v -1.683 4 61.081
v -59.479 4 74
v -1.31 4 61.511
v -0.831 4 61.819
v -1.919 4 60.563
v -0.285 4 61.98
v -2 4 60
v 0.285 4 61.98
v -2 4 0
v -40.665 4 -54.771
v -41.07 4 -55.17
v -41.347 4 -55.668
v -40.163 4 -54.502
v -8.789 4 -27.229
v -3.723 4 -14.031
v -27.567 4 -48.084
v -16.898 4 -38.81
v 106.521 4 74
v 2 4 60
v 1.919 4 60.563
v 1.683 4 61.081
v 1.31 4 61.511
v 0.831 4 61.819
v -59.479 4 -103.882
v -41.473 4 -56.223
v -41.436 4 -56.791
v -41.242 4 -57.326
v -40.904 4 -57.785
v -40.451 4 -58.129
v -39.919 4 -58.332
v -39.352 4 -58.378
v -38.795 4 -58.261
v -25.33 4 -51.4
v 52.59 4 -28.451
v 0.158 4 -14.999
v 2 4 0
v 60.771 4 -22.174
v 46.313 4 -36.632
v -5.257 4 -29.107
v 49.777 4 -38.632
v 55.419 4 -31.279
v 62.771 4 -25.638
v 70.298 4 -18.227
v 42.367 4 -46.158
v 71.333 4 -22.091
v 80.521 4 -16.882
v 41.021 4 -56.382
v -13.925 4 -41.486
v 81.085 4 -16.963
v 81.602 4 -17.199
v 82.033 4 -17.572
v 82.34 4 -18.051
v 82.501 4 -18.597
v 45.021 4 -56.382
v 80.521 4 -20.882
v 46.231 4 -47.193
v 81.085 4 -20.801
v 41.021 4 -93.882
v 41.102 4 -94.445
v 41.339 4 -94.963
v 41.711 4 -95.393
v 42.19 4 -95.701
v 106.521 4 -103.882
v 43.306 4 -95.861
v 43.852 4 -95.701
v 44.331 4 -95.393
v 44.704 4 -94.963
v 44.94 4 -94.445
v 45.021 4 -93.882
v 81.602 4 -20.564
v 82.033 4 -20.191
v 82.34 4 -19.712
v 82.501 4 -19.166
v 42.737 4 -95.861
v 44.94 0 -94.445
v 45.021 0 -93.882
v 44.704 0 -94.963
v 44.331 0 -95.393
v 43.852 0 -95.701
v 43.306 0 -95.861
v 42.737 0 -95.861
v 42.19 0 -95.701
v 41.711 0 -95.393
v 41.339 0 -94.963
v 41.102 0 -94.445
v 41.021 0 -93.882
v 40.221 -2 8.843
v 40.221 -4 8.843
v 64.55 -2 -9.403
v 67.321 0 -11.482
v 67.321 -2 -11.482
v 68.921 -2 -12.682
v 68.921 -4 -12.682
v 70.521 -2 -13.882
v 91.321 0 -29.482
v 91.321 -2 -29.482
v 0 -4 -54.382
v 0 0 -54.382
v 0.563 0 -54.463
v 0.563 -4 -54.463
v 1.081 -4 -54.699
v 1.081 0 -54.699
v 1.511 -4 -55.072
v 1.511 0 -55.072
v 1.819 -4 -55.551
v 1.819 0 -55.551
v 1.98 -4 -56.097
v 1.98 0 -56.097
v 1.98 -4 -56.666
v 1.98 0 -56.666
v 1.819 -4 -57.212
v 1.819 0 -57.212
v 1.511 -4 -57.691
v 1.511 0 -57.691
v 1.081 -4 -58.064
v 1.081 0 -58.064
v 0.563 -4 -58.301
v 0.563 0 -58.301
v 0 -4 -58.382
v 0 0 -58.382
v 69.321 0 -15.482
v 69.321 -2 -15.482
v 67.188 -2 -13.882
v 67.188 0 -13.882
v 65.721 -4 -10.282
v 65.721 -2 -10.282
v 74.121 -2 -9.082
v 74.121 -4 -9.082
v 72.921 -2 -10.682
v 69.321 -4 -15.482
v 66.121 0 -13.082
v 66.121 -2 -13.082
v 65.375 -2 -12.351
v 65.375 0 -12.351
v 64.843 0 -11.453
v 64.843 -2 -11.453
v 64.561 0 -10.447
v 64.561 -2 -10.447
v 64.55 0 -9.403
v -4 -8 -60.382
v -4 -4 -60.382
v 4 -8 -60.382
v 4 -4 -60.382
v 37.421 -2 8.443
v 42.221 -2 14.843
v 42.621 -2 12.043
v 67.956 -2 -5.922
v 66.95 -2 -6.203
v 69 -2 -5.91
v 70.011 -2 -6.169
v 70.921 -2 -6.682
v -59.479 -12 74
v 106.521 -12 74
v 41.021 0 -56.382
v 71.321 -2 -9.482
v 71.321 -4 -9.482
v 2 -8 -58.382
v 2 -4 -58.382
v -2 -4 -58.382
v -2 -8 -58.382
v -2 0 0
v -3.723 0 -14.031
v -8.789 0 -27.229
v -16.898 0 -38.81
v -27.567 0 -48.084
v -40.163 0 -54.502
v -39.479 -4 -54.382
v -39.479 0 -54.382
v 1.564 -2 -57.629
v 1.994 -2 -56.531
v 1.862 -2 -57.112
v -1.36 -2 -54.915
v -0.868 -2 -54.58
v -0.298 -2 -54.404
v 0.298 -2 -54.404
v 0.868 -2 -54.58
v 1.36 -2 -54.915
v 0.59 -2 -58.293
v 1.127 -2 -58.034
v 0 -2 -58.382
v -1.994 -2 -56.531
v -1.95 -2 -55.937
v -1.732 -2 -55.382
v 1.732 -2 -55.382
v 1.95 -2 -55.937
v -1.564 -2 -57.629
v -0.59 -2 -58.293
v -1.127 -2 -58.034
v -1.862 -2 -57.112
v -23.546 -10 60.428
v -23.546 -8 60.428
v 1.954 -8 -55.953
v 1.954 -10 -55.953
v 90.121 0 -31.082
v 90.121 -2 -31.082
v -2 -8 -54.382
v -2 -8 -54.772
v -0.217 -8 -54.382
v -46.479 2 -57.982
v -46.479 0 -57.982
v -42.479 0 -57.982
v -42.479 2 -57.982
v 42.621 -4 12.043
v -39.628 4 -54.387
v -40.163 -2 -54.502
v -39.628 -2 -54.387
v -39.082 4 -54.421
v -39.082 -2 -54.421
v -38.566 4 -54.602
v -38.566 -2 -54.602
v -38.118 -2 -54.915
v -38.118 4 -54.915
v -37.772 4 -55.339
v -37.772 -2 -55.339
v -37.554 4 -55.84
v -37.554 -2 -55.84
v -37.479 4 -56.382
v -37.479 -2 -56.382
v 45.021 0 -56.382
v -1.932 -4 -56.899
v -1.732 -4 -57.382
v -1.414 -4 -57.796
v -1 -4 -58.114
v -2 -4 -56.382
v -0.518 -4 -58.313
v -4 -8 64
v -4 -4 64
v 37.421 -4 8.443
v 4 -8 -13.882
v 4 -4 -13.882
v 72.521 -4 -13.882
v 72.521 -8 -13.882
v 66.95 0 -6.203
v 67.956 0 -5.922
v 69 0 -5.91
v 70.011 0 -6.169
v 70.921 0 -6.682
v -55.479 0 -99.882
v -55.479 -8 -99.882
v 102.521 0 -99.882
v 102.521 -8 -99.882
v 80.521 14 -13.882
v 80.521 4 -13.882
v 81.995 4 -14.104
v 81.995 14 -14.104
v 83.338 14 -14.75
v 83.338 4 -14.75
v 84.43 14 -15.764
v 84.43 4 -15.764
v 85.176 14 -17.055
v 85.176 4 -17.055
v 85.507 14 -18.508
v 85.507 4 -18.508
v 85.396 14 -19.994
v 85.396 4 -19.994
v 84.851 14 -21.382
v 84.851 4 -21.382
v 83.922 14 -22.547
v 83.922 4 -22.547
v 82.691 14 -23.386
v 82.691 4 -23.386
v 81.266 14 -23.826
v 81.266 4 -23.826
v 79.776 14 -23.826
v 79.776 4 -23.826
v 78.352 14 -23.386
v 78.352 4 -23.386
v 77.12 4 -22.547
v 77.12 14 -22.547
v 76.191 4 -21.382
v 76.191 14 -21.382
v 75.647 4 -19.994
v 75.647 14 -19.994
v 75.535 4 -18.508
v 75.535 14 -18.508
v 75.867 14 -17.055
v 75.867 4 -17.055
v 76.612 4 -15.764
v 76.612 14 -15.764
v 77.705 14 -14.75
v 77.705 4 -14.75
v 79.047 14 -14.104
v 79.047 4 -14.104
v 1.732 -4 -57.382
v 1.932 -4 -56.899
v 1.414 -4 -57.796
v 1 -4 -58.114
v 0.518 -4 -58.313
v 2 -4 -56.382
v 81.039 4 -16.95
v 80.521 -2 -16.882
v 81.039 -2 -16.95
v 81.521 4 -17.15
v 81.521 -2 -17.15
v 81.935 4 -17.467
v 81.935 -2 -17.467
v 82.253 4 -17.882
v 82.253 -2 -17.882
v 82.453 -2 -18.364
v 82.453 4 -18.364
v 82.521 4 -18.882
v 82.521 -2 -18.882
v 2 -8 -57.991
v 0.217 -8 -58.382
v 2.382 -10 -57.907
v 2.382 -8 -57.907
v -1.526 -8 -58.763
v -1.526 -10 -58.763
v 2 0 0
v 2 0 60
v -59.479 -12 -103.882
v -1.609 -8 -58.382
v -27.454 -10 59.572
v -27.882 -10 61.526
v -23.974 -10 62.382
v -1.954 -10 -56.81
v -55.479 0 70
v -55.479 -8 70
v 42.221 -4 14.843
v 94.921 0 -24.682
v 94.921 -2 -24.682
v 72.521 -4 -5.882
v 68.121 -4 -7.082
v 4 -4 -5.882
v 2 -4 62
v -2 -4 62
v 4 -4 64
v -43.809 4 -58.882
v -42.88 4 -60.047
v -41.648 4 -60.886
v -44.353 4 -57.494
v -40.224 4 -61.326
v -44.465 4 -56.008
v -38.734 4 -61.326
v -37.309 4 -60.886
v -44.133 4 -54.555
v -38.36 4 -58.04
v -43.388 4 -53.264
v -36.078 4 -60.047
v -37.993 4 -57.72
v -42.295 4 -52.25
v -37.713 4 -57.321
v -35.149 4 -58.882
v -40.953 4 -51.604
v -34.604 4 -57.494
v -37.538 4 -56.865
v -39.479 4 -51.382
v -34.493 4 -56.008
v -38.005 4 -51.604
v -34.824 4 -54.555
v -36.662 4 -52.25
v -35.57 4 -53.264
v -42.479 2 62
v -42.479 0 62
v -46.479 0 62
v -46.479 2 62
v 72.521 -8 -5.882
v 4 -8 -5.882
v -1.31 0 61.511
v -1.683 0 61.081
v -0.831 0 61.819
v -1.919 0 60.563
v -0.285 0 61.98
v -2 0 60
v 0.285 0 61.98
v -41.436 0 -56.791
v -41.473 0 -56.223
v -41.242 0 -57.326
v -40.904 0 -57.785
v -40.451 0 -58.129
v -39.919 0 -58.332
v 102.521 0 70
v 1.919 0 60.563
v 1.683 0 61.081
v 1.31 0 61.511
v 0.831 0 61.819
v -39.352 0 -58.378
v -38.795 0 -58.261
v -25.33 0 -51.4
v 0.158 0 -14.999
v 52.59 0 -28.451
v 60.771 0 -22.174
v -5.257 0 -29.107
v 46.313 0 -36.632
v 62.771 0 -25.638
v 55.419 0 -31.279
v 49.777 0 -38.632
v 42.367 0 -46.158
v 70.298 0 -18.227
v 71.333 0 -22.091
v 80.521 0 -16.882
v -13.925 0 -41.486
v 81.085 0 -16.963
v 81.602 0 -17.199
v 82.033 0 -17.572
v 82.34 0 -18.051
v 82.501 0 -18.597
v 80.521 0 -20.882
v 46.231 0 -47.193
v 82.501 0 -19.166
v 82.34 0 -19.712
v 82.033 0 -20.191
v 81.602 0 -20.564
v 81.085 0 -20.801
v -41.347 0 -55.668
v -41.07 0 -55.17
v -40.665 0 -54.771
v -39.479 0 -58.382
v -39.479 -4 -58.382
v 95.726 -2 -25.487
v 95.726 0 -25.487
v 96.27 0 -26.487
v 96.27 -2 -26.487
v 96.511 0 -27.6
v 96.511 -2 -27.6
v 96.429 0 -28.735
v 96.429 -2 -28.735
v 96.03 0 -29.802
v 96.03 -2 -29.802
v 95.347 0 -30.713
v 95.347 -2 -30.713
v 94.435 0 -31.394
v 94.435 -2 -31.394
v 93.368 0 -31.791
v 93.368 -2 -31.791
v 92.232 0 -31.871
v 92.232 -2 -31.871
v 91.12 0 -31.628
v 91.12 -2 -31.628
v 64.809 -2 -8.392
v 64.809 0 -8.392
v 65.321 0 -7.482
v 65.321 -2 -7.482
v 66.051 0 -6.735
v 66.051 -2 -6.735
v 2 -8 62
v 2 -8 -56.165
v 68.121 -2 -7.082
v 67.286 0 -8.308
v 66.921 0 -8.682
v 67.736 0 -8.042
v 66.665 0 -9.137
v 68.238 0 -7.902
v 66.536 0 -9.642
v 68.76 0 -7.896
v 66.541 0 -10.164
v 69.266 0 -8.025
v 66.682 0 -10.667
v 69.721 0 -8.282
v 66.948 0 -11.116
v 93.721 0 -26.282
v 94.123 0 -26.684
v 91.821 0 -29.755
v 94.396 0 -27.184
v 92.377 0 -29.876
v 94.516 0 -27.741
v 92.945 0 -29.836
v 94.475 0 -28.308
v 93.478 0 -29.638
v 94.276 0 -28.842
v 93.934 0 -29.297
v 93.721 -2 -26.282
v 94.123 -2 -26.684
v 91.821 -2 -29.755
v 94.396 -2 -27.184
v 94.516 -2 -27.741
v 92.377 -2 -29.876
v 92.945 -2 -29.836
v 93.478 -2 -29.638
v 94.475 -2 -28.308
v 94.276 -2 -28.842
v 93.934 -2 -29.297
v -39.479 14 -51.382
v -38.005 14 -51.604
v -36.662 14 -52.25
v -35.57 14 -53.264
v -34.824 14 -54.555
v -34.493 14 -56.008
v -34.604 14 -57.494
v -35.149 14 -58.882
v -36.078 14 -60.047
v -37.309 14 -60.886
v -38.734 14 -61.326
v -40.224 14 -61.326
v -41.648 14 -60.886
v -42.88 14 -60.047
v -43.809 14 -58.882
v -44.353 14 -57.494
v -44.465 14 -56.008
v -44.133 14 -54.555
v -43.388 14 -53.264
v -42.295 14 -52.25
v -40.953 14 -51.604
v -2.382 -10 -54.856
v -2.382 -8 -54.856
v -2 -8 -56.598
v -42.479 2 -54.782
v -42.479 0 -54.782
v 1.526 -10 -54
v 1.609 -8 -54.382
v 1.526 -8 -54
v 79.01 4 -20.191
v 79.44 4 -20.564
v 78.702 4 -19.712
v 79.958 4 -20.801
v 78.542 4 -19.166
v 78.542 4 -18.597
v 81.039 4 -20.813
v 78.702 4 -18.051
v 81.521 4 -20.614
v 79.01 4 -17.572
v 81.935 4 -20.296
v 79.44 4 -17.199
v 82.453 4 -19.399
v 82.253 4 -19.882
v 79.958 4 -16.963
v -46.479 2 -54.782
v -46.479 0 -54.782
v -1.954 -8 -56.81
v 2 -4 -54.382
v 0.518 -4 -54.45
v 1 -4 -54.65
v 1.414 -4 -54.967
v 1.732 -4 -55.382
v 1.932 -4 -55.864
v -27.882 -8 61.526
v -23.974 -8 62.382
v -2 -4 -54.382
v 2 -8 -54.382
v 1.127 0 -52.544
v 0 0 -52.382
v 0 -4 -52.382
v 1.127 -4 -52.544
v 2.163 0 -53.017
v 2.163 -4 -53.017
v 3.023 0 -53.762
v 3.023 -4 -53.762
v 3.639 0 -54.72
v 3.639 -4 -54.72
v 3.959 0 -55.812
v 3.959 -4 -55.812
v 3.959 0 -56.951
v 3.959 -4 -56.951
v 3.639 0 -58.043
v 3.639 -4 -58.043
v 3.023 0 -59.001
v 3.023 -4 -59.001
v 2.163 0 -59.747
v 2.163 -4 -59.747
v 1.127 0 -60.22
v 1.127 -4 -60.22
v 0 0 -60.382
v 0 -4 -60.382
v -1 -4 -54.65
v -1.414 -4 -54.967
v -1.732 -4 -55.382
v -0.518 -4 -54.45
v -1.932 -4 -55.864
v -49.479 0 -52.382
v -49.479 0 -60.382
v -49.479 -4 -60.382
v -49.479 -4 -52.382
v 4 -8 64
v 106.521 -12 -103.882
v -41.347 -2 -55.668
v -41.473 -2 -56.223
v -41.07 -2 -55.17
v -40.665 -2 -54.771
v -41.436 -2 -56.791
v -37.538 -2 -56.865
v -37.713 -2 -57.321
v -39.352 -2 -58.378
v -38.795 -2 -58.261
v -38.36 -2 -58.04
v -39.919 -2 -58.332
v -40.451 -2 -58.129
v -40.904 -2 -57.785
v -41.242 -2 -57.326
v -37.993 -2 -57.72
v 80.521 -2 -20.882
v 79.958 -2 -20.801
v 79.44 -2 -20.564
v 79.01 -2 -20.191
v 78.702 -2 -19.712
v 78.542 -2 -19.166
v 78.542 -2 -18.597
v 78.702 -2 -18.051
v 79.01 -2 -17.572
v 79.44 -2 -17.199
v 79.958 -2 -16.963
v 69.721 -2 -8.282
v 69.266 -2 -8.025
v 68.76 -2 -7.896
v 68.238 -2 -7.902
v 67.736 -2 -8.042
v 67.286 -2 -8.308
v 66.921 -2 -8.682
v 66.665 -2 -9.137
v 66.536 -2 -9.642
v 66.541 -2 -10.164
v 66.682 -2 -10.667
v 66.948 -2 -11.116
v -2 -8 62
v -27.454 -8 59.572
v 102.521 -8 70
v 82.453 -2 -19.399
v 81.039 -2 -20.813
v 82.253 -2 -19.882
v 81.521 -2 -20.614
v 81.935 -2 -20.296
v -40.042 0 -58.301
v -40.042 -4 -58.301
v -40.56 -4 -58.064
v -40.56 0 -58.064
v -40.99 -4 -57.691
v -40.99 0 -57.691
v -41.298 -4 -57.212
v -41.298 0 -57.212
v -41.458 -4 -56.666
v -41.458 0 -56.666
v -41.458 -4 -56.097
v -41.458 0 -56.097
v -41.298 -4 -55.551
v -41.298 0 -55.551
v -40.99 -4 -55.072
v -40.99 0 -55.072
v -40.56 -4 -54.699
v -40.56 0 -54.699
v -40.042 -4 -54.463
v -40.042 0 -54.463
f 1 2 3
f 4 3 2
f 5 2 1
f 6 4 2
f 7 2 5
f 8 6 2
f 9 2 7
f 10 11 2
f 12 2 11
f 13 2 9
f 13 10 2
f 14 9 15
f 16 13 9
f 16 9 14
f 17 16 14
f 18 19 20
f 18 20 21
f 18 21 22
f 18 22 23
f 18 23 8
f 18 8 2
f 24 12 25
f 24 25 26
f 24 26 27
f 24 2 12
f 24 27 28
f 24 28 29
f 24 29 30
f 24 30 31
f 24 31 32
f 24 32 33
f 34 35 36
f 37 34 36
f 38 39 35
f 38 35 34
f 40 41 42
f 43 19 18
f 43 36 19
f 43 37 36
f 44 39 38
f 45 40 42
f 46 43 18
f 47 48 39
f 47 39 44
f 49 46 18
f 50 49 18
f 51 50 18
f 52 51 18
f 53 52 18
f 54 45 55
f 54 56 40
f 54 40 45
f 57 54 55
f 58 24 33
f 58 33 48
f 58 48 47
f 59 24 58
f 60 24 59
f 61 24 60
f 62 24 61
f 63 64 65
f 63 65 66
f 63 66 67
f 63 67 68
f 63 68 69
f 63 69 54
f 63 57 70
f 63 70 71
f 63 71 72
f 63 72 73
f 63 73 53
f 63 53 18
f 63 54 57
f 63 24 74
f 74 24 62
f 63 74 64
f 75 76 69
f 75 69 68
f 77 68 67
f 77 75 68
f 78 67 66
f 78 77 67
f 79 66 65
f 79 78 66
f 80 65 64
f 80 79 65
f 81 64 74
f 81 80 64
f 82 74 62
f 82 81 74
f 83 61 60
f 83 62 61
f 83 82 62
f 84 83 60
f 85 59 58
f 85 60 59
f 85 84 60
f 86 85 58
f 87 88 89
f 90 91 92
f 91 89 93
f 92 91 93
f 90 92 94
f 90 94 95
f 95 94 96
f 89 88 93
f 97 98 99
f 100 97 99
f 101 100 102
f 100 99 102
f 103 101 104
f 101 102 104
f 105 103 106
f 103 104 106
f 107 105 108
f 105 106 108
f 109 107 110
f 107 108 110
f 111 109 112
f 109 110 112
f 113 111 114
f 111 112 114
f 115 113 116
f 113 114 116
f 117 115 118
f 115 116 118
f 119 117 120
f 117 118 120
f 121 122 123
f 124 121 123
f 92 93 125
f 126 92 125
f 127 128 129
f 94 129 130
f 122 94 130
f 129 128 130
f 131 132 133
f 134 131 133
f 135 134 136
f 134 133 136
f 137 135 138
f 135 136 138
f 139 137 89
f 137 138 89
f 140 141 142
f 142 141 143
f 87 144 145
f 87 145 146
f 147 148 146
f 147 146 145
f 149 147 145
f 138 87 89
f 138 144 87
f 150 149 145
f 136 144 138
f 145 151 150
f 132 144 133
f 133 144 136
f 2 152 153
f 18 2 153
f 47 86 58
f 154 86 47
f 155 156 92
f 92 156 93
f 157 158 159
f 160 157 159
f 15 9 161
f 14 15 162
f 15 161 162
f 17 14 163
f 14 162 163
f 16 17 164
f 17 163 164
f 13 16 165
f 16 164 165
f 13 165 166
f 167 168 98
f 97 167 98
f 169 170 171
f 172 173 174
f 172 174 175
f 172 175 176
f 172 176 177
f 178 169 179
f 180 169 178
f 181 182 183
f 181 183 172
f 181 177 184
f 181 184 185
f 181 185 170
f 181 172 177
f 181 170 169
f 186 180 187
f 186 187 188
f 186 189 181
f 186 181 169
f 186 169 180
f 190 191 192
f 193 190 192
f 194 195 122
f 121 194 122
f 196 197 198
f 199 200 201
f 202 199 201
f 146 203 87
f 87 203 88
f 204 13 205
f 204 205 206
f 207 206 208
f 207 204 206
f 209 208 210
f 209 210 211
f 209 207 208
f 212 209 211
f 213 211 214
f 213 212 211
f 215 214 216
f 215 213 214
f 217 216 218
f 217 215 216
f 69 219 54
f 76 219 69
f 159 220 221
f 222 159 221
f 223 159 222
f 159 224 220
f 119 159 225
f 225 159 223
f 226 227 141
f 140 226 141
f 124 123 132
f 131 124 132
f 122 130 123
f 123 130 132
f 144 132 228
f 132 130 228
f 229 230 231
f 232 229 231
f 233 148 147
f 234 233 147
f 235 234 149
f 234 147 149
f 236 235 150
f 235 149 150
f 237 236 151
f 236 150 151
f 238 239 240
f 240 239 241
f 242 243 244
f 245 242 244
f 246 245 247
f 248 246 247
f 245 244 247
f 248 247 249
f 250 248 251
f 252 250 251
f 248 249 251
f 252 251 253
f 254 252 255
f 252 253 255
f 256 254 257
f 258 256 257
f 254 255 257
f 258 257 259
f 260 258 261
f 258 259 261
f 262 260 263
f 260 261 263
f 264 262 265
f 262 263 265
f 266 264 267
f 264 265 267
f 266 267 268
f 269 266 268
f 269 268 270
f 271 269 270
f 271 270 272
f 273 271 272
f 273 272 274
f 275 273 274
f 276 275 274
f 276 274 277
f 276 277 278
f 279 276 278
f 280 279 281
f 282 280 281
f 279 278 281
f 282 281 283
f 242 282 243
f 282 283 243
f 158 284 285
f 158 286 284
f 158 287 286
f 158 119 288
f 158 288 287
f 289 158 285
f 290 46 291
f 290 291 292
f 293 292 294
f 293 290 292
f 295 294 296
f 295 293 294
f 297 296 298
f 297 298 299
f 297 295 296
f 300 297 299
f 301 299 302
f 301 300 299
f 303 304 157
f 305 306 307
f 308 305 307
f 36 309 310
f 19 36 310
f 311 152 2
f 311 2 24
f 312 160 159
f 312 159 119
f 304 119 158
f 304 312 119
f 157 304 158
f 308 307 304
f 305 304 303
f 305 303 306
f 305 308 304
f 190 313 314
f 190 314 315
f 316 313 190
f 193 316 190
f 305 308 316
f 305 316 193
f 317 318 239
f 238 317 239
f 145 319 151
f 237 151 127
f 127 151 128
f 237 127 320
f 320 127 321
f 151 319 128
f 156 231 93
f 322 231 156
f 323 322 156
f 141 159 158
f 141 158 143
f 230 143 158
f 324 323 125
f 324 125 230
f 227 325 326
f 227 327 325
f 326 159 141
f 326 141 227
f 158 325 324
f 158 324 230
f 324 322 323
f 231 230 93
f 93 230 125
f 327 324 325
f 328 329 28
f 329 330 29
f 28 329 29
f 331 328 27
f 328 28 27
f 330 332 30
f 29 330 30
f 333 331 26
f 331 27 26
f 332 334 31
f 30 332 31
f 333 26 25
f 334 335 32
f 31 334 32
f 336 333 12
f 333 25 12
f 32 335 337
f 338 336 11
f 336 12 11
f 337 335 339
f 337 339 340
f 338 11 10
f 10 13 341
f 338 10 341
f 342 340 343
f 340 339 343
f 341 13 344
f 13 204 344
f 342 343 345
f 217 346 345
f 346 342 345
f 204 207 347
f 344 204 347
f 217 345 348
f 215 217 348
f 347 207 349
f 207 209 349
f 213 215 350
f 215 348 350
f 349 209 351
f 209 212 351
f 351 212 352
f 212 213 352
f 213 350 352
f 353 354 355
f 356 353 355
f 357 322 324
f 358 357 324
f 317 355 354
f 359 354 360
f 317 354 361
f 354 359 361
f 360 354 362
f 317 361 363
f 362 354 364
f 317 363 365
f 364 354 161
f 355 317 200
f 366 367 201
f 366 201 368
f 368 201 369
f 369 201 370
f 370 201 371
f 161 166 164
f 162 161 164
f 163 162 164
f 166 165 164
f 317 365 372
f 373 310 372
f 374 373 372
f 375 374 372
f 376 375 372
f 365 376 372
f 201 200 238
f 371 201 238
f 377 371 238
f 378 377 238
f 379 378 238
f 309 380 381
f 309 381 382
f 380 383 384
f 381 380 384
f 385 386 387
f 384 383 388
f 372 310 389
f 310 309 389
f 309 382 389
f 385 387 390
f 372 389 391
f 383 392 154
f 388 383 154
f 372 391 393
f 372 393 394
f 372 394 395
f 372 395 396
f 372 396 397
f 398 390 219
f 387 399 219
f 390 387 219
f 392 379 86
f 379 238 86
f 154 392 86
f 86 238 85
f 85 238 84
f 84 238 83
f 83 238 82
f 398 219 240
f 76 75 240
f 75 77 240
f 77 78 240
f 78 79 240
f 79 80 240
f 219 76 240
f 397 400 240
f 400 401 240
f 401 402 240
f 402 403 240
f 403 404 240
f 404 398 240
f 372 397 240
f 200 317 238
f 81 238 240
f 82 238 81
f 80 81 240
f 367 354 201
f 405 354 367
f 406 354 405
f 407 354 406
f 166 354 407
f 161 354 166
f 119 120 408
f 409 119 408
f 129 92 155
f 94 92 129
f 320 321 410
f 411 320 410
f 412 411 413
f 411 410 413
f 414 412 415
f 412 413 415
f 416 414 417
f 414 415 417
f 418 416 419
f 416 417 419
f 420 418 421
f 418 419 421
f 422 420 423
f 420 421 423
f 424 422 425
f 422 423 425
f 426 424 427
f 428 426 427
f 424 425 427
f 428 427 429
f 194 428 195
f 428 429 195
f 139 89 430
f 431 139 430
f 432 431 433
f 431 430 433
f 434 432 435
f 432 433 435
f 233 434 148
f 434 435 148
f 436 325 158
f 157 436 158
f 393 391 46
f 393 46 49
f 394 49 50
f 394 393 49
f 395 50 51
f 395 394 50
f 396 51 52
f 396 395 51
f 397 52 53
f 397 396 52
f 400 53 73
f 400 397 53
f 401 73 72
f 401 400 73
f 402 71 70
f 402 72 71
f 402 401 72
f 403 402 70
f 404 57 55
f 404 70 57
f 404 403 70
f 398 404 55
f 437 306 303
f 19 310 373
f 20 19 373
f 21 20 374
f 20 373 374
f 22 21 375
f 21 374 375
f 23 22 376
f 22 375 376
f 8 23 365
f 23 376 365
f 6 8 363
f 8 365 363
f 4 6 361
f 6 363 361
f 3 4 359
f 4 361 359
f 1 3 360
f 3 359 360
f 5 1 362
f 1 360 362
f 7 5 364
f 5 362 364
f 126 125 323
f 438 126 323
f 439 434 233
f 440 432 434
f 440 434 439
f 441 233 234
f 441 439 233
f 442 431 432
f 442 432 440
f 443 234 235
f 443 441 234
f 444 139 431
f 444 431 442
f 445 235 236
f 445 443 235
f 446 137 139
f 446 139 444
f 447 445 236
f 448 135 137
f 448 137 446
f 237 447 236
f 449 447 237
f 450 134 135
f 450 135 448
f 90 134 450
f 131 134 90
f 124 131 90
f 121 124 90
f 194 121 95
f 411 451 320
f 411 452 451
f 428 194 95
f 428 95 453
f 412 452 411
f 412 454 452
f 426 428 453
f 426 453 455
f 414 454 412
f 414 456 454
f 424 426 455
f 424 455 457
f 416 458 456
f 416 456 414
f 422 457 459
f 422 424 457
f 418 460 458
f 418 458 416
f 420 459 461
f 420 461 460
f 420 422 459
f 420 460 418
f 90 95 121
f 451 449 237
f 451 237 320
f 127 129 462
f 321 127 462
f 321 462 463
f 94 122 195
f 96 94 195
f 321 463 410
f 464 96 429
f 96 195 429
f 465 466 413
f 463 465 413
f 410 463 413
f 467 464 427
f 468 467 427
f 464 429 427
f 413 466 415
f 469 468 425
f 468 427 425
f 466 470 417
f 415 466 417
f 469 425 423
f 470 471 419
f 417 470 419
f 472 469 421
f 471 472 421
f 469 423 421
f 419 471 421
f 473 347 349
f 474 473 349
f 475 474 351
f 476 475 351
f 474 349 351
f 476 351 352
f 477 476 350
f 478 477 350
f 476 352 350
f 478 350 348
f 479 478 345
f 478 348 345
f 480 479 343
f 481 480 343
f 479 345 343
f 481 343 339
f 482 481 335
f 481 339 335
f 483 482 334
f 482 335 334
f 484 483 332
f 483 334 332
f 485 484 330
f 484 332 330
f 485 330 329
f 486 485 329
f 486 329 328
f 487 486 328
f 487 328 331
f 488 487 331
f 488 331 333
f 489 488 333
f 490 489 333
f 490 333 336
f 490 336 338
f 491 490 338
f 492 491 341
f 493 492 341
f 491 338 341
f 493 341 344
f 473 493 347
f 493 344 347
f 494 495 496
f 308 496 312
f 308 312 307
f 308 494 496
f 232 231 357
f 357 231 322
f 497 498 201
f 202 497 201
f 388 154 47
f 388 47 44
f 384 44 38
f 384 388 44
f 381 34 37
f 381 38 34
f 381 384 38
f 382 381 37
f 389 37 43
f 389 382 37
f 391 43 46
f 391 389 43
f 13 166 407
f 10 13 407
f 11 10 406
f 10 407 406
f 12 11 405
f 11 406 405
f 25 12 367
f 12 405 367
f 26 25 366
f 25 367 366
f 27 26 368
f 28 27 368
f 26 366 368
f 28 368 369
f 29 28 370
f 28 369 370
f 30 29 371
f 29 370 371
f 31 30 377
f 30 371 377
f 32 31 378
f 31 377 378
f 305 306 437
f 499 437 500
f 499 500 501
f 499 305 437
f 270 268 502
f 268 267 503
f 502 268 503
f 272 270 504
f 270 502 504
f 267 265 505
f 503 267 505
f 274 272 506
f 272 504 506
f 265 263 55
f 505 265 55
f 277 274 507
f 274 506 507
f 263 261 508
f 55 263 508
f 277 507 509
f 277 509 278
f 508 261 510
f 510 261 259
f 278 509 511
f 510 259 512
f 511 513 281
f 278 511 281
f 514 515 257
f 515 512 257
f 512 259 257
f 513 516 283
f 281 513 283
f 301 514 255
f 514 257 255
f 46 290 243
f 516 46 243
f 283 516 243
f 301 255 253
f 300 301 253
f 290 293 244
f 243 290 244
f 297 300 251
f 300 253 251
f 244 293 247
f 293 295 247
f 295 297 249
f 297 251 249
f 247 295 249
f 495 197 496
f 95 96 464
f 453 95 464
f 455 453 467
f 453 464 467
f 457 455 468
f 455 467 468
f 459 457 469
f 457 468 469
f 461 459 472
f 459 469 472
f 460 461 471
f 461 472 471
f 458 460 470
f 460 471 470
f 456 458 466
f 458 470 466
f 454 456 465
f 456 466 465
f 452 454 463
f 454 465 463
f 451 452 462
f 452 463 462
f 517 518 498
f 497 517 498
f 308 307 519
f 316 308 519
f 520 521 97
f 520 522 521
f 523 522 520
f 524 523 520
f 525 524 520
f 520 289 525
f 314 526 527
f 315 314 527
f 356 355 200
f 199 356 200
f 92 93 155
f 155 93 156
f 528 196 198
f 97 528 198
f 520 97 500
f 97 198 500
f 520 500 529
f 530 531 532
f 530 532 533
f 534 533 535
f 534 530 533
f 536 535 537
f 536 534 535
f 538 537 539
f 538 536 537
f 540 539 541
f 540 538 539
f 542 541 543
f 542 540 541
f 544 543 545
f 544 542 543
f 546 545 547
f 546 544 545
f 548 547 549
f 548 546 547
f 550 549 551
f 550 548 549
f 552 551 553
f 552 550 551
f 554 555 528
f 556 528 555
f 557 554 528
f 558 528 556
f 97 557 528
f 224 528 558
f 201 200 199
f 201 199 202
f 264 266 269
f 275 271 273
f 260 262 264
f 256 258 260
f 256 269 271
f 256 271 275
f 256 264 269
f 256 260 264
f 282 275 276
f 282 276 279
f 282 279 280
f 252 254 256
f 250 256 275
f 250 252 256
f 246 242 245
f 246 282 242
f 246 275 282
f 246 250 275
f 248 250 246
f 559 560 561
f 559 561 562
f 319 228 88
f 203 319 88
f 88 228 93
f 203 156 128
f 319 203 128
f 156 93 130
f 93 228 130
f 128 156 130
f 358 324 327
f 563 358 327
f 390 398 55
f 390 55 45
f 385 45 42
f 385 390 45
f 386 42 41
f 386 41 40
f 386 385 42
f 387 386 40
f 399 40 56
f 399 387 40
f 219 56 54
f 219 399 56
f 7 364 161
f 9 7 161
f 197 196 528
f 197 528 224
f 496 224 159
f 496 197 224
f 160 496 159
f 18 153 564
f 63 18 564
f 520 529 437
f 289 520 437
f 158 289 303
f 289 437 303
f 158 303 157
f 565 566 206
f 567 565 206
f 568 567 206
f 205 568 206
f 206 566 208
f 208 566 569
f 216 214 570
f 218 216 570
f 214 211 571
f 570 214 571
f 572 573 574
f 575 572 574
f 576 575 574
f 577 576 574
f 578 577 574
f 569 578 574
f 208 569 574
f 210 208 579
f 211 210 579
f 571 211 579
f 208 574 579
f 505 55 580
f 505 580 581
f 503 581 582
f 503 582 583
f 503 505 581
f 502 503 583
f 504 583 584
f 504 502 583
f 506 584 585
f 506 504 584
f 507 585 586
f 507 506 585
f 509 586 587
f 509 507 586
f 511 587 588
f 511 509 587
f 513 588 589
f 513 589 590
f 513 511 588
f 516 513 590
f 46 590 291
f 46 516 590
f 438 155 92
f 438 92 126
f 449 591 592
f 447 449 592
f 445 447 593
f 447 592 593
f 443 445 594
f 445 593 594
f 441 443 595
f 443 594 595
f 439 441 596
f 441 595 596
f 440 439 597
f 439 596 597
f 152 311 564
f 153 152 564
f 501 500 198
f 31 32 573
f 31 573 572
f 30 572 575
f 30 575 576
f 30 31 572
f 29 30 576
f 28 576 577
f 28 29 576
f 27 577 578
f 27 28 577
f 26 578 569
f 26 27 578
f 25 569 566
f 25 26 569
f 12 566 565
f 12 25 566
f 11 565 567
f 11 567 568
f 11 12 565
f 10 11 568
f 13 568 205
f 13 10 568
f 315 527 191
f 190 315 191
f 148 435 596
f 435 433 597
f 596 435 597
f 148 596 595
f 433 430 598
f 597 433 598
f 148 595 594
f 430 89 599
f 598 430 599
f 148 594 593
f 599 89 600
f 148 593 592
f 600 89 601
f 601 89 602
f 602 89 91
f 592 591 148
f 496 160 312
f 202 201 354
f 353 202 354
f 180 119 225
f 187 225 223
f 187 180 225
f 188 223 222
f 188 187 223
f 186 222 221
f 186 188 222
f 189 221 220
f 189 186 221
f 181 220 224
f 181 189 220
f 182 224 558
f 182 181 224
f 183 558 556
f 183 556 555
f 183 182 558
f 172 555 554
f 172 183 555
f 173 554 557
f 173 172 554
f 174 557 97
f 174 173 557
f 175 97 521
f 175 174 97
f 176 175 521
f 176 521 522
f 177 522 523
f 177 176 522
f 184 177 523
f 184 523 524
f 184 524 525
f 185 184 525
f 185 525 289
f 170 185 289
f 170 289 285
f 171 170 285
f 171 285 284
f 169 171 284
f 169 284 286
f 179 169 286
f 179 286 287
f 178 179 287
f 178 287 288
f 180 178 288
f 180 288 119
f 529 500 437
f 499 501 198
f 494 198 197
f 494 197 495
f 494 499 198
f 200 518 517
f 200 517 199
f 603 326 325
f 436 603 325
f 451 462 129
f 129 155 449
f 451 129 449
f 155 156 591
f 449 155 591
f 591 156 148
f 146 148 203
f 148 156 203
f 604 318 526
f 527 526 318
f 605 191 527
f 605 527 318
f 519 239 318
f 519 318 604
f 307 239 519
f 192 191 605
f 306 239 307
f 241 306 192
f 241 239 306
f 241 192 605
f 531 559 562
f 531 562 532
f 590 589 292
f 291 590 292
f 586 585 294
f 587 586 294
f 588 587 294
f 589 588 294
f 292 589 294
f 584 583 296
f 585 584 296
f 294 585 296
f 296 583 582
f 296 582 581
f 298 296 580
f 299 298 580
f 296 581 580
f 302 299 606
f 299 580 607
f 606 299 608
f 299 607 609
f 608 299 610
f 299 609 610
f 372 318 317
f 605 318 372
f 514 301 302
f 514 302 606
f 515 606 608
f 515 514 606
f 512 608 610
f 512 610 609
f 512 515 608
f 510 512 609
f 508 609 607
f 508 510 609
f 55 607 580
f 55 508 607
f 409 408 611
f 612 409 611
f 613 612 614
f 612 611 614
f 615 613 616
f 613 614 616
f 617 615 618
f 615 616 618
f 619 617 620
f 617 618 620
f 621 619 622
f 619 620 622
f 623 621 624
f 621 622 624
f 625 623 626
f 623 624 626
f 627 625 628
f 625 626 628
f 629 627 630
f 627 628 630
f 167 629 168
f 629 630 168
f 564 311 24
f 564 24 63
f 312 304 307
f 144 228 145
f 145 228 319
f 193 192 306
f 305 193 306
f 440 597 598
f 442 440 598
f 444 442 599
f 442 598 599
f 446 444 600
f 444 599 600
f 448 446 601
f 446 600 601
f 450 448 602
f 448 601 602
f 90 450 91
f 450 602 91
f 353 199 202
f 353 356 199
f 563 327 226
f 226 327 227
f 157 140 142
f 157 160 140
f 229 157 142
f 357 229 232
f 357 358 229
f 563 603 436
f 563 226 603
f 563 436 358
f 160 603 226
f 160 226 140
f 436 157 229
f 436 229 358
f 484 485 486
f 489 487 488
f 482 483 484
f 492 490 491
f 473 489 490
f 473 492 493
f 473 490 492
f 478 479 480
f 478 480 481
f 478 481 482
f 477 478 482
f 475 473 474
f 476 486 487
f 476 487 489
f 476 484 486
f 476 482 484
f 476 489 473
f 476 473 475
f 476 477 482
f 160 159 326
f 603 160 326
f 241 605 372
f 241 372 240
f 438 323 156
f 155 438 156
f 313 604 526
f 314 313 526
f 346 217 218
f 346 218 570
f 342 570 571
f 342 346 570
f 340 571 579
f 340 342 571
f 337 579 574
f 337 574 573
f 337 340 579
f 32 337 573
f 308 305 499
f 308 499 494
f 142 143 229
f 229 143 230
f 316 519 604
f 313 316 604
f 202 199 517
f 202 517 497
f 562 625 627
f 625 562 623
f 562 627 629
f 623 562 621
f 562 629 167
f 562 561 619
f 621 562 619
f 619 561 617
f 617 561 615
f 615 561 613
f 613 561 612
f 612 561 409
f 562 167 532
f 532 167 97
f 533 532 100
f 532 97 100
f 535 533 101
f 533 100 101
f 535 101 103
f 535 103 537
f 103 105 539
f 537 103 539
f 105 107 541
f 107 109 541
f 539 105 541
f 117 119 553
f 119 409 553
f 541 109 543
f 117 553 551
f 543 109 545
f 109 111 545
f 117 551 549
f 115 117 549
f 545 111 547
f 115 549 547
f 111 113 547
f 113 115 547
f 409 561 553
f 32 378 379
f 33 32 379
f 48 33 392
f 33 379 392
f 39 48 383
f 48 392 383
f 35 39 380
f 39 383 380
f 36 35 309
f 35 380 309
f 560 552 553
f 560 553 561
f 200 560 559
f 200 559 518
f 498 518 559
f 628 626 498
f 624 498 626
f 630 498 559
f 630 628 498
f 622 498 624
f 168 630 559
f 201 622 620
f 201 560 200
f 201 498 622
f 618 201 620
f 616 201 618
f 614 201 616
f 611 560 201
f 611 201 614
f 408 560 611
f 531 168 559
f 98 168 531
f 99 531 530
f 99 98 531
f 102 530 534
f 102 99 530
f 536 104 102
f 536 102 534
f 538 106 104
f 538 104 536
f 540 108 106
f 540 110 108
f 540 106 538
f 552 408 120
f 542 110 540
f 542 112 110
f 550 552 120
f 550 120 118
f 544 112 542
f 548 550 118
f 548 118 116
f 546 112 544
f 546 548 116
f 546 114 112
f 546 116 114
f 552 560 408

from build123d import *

# Parameters (mm, degrees)
SKETCH3_W                = 4
SKETCH3_H                = 3.2
BOSS_EXTRUDE1_DEPTH      = 4
SKETCH3_3_W              = 4
SKETCH3_3_H              = 3.2
BOSS_EXTRUDE2_DEPTH      = 2
SKETCH4_W                = 2
SKETCH4_H                = 2
BOSS_EXTRUDE3_DEPTH      = 4
BOSS_EXTRUDE4_DEPTH      = 2
BOSS_EXTRUDE5_DEPTH      = 2
BOSS_EXTRUDE6_START      = 2
BOSS_EXTRUDE6_DEPTH      = 2
BOSS_EXTRUDE7_DEPTH      = 4
BOSS_EXTRUDE7_DEPTH_BACK = 12
SKETCH6_W                = 166
SKETCH6_H                = 177.881557247
SHELL1_START             = -8
SHELL1_OUTLINE_W         = 158
SHELL1_OUTLINE_H         = 169.881557247
SHELL1_DEPTH             = 8
CUT_EXTRUDE1_DEPTH       = 2
BOSS_EXTRUDE8_DEPTH      = 2
BOSS_EXTRUDE9_START      = 2
SKETCH8_4_W              = 4
SKETCH8_4_H              = 4
BOSS_EXTRUDE9_DEPTH      = 4
BOSS_EXTRUDE11_START     = 8
SKETCH8_5_R              = 2
BOSS_EXTRUDE11_DEPTH     = 2
CUT_EXTRUDE2_DEPTH       = 2
CUT_EXTRUDE3_DEPTH       = 150.272053036
BOSS_EXTRUDE12_DEPTH     = 6
SKETCH12_3_R             = 5
BOSS_EXTRUDE13_DEPTH     = 10
BOSS_EXTRUDE14_DEPTH     = 6
SKETCH13_3_R             = 5
BOSS_EXTRUDE15_DEPTH     = 10


# Read off the part's stored shape, not the designer's step: Shell1
with BuildPart() as part:
    # Sketch3 → Boss-Extrude1 (new body)
    # profile 1 of 2: a face of its own
    with BuildSketch(Plane(origin=(0, 0, 0), x_dir=(1, 0, 0), z_dir=(0, 1, 0))):
        with BuildLine():
            Line((-39.4787914, 52.381557247), (0, 52.381557247))
            ThreePointArc((0, 52.381557247), (4, 56.381557247), (0, 60.381557247))
            Line((0, 60.381557247), (-39.4787914, 60.381557247))
            Line((-39.4787914, 60.381557247), (-49.4787914, 60.381557247))
            Line((-49.4787914, 60.381557247), (-49.4787914, 52.381557247))
            Line((-49.4787914, 52.381557247), (-39.4787914, 52.381557247))
        make_face()
        with Locations((-44.4787914, 56.381557247)):
            Rectangle(SKETCH3_W, SKETCH3_H, mode=Mode.SUBTRACT)
        with BuildLine():
            ThreePointArc((0, 54.381557247), (2, 56.381557247), (0, 58.381557247))
            Line((0, 58.381557247), (-39.4787914, 58.381557247))
            ThreePointArc((-39.4787914, 58.381557247), (-41.4787914, 56.381557247), (-39.4787914, 54.381557247))
            Line((-39.4787914, 54.381557247), (0, 54.381557247))
        make_face(mode=Mode.SUBTRACT)
    # profile 2 of 2: a face of its own
    with BuildSketch(Plane(origin=(0, 0, 0), x_dir=(1, 0, 0), z_dir=(0, 1, 0))):
        with Locations((-44.4787914, 56.381557247)):
            Rectangle(SKETCH3_W, SKETCH3_H)
    extrude(amount=-BOSS_EXTRUDE1_DEPTH)

    # Sketch3<3> → Boss-Extrude2 (add)
    with BuildSketch(Plane(origin=(0, 0, 0), x_dir=(1, 0, 0), z_dir=(0, 1, 0))):
        with Locations((-44.4787914, 56.381557247)):
            Rectangle(SKETCH3_3_W, SKETCH3_3_H)
    extrude(amount=BOSS_EXTRUDE2_DEPTH)


with BuildPart() as body_2:
    # Sketch4 → Boss-Extrude3 (new body)
    # profile 1 of 7: a face of its own
    with BuildSketch(Plane.XZ.offset(4)):
        with Locations((-3, -53.381557247)):
            Rectangle(SKETCH4_W, SKETCH4_H)
    # profile 2 of 7: a face of its own
    with BuildSketch(Plane.XZ.offset(4)):
        Polygon((-2, -56.381557247), (-2, -54.381557247), (-4, -54.381557247), (-4, -56.381557247), (-4, -58.381557247), (-2, -58.381557247), align=None)
    # profile 3 of 7: a face of its own
    with BuildSketch(Plane.XZ.offset(4)):
        with BuildLine():
            ThreePointArc((4, -56.381557247), (3.464101615, -54.381557247), (2, -52.917455632))
            Line((2, -52.917455632), (2, -56.381557247))
            Line((2, -56.381557247), (2, -58.381557247))
            Line((2, -58.381557247), (0, -58.381557247))
            Line((0, -58.381557247), (-2, -58.381557247))
            Line((-2, -58.381557247), (-4, -58.381557247))
            Line((-4, -58.381557247), (-4, -60.381557247))
            Line((-4, -60.381557247), (0, -60.381557247))
            ThreePointArc((0, -60.381557247), (2.828427125, -59.209984372), (4, -56.381557247))
        make_face()
    # profile 4 of 7: a face of its own
    with BuildSketch(Plane.XZ.offset(4)):
        with BuildLine():
            Line((4, -60.381557247), (4, -56.381557247))
            ThreePointArc((4, -56.381557247), (2.828427125, -59.209984372), (0, -60.381557247))
            Line((0, -60.381557247), (4, -60.381557247))
        make_face()
    # profile 5 of 7: a face of its own
    with BuildSketch(Plane.XZ.offset(4)):
        with BuildLine():
            Line((-2, -52.381557247), (-2, 60))
            Line((-2, 60), (-2, 62))
            Line((-2, 62), (2, 62))
            Line((2, 62), (2, 60))
            Line((2, 60), (2, -52.917455632))
            ThreePointArc((2, -52.917455632), (3.464101615, -54.381557247), (4, -56.381557247))
            Line((4, -56.381557247), (4, -13.881557247))
            Line((4, -13.881557247), (4, -5.881557247))
            Line((4, -5.881557247), (4, 60))
            Line((4, 60), (4, 64))
            Line((4, 64), (-4, 64))
            Line((-4, 64), (-4, 60))
            Line((-4, 60), (-4, -52.381557247))
            Line((-4, -52.381557247), (-2, -52.381557247))
        make_face()
    # profile 6 of 7: a face of its own
    with BuildSketch(Plane.XZ.offset(4)):
        Polygon((4, -5.881557247), (4, -13.881557247), (68.5212086, -13.881557247), (72.5212086, -13.881557247), (72.5212086, -5.881557247), (68.5212086, -5.881557247), align=None)
        Polygon((68.9212086, -12.681557247), (65.7212086, -10.281557247), (68.1212086, -7.081557247), (71.3212086, -9.481557247), align=None, mode=Mode.SUBTRACT)
    # profile 7 of 7: a face of its own
    with BuildSketch(Plane.XZ.offset(4)):
        Polygon((68.1212086, -7.081557247), (71.3212086, -9.481557247), (68.9212086, -12.681557247), (65.7212086, -10.281557247), align=None)
    extrude(amount=BOSS_EXTRUDE3_DEPTH)

    # Sketch4<3> → Boss-Extrude4 (add)
    with BuildSketch(Plane.XZ.offset(4)):
        Polygon((68.1212086, -7.081557247), (71.3212086, -9.481557247), (68.9212086, -12.681557247), (65.7212086, -10.281557247), align=None)
    extrude(amount=-BOSS_EXTRUDE4_DEPTH)


with BuildPart() as body_3:
    # Sketch5 → Boss-Extrude5 (new body)
    with BuildSketch(Plane(origin=(0, -4, 0), x_dir=(1, 0, 0), z_dir=(0, 1, 0))):
        Polygon((42.2212086, -14.843442753), (74.1212086, 9.081557247), (69.3212086, 15.481557247), (37.4212086, -8.443442753), align=None)
        Polygon((68.9212086, 12.681557247), (71.3212086, 9.481557247), (42.6212086, -12.043442753), (40.2212086, -8.843442753), align=None, mode=Mode.SUBTRACT)
    extrude(amount=BOSS_EXTRUDE5_DEPTH)

    # Sketch5<5> → Boss-Extrude6 (add)
    with BuildSketch(Plane(origin=(0, -4, 0), x_dir=(1, 0, 0), z_dir=(0, 1, 0)).offset(BOSS_EXTRUDE6_START)):
        with BuildLine():
            ThreePointArc((64.549927307, 9.403096278), (65.3212086, 7.481557247), (66.949927307, 6.203096278))
            Line((66.949927307, 6.203096278), (68.1212086, 7.081557247))
            Line((68.1212086, 7.081557247), (66.921208622, 8.681557218))
            Line((66.921208622, 8.681557218), (65.7212086, 10.281557247))
            Line((65.7212086, 10.281557247), (64.549927307, 9.403096278))
        make_face()
        with BuildLine():
            Line((66.921208622, 8.681557218), (68.1212086, 7.081557247))
            Line((68.1212086, 7.081557247), (69.7212086, 8.281557247))
            ThreePointArc((69.7212086, 8.281557247), (68.238365905, 7.901658257), (66.921208622, 8.681557218))
        make_face()
        with BuildLine():
            Line((65.7212086, 10.281557247), (66.921208622, 8.681557218))
            ThreePointArc((66.921208622, 8.681557218), (66.54130961, 10.164399941), (67.3212086, 11.481557247))
            Line((67.3212086, 11.481557247), (65.7212086, 10.281557247))
        make_face()
        with BuildLine():
            ThreePointArc((66.1212086, 13.081557247), (64.84274763, 11.452838539), (64.549927307, 9.403096278))
            Line((64.549927307, 9.403096278), (65.7212086, 10.281557247))
            Line((65.7212086, 10.281557247), (67.3212086, 11.481557247))
            Line((67.3212086, 11.481557247), (68.9212086, 12.681557247))
            Line((68.9212086, 12.681557247), (70.5212086, 13.881557247))
            Line((70.5212086, 13.881557247), (67.187875266, 13.881557247))
            Line((67.187875266, 13.881557247), (66.1212086, 13.081557247))
        make_face()
        with BuildLine():
            ThreePointArc((66.949927307, 6.203096278), (68.999669569, 5.910275955), (70.9212086, 6.681557247))
            Line((70.9212086, 6.681557247), (72.5212086, 7.881557247))
            Line((72.5212086, 7.881557247), (72.5212086, 10.381557247))
            Line((72.5212086, 10.381557247), (71.3212086, 9.481557247))
            Line((71.3212086, 9.481557247), (69.7212086, 8.281557247))
            Line((69.7212086, 8.281557247), (68.1212086, 7.081557247))
            Line((68.1212086, 7.081557247), (66.949927307, 6.203096278))
        make_face()
        Polygon((72.5212086, 10.381557247), (72.5212086, 7.881557247), (74.1212086, 9.081557247), (72.9212086, 10.681557247), align=None)
        Polygon((67.187875266, 13.881557247), (70.5212086, 13.881557247), (69.3212086, 15.481557247), align=None)
        with BuildLine():
            Line((72.9212086, 10.681557247), (74.1212086, 9.081557247))
            Line((74.1212086, 9.081557247), (94.9212086, 24.681557247))
            ThreePointArc((94.9212086, 24.681557247), (95.7212086, 30.281557247), (90.1212086, 31.081557247))
            Line((90.1212086, 31.081557247), (69.3212086, 15.481557247))
            Line((69.3212086, 15.481557247), (70.5212086, 13.881557247))
            Line((70.5212086, 13.881557247), (91.3212086, 29.481557247))
            ThreePointArc((91.3212086, 29.481557247), (94.1212086, 29.081557247), (93.7212086, 26.281557247))
            Line((93.7212086, 26.281557247), (72.9212086, 10.681557247))
        make_face()
    extrude(amount=BOSS_EXTRUDE6_DEPTH)


with BuildPart() as body_4:
    # Sketch6 → Boss-Extrude7 (new, two sides: drawn at the far end of the back side and taken through both)
    with BuildSketch(Plane(origin=(0, 0, 0), x_dir=(1, 0, 0), z_dir=(0, 1, 0)).offset(-BOSS_EXTRUDE7_DEPTH_BACK)):
        with Locations((23.5212086, 14.940778624)):
            Rectangle(SKETCH6_W, SKETCH6_H)
    extrude(amount=BOSS_EXTRUDE7_DEPTH + BOSS_EXTRUDE7_DEPTH_BACK)

    # Shell1 outline → Shell1 (cut)
    with BuildSketch(Plane(origin=(0, 0, 0), x_dir=(1, 0, 0), z_dir=(0, 1, 0)).offset(SHELL1_START)):
        with Locations((23.5212086, 14.940778624)):
            Rectangle(SHELL1_OUTLINE_W, SHELL1_OUTLINE_H)
    extrude(amount=SHELL1_DEPTH, mode=Mode.SUBTRACT)

    # Sketch7 → Cut-Extrude1 (cut)
    with BuildSketch(Plane(origin=(0, -8, 0), x_dir=(1, 0, 0), z_dir=(0, 1, 0))):
        Polygon((-1.953654369, 56.809616362), (-27.453654369, -59.571940885), (-27.881713484, -61.525595254), (-23.974404746, -62.381713484), (-23.546345631, -60.428059115), (1.953654369, 55.953498132), (2.381713484, 57.907152501), (-1.525595254, 58.763270731), align=None)
    extrude(amount=-CUT_EXTRUDE1_DEPTH, mode=Mode.SUBTRACT)

    # Sketch10 → Cut-Extrude2 (cut)
    with BuildSketch(Plane.XZ):
        Polygon((-46.4787914, 60), (-46.4787914, -56.381557247), (-46.4787914, -57.981557247), (-42.4787914, -57.981557247), (-42.4787914, -56.381557247), (-42.4787914, 60), (-42.4787914, 62), (-46.4787914, 62), align=None)
    extrude(amount=-CUT_EXTRUDE2_DEPTH, mode=Mode.SUBTRACT)

    # Sketch11 → Cut-Extrude3 (cut, through all)
    with BuildSketch(Plane.XZ):
        with BuildLine():
            Line((-2, 60), (-2, 0))
            ThreePointArc((-2, 0), (-12.489181431, -33.267433308), (-40.162831687, -54.502172006))
            ThreePointArc((-40.162831687, -54.502172006), (-41.358176642, -57.065597534), (-38.794751114, -58.260942489))
            ThreePointArc((-38.794751114, -58.260942489), (-9.212573254, -35.561739054), (2, 0))
            Line((2, 0), (2, 60))
            ThreePointArc((2, 60), (0, 62), (-2, 60))
        make_face()
        with BuildLine():
            Line((41.0212086, -93.881557247), (41.0212086, -56.381557247))
            ThreePointArc((41.0212086, -56.381557247), (52.590490743, -28.45083939), (80.5212086, -16.881557247))
            ThreePointArc((80.5212086, -16.881557247), (82.5212086, -18.881557247), (80.5212086, -20.881557247))
            ThreePointArc((80.5212086, -20.881557247), (55.418917867, -31.279266515), (45.0212086, -56.381557247))
            Line((45.0212086, -56.381557247), (45.0212086, -93.881557247))
            ThreePointArc((45.0212086, -93.881557247), (43.0212086, -95.881557247), (41.0212086, -93.881557247))
        make_face()
    extrude(amount=-CUT_EXTRUDE3_DEPTH, mode=Mode.SUBTRACT)


with BuildPart() as body_5:
    # Sketch8 → Boss-Extrude8 (new body)
    with BuildSketch(Plane(origin=(0, -10, 0), x_dir=(1, 0, 0), z_dir=(0, 1, 0))):
        Polygon((-1.525595254, 58.763270731), (2.381713484, 57.907152501), (1.525595254, 53.999843763), (-2.381713484, 54.855961993), align=None)
    extrude(amount=BOSS_EXTRUDE8_DEPTH)

    # Sketch8<4> → Boss-Extrude9 (add)
    with BuildSketch(Plane(origin=(0, -10, 0), x_dir=(1, 0, 0), z_dir=(0, 1, 0)).offset(BOSS_EXTRUDE9_START)):
        with Locations((0, 56.381557247)):
            Rectangle(SKETCH8_4_W, SKETCH8_4_H)
    extrude(amount=BOSS_EXTRUDE9_DEPTH)

    # Sketch8<5> → Boss-Extrude11 (add)
    with BuildSketch(Plane(origin=(0, -10, 0), x_dir=(1, 0, 0), z_dir=(0, 1, 0)).offset(BOSS_EXTRUDE11_START)):
        with Locations(Location((0, 56.381557247, 0), (0, 0, 90))):
            Circle(SKETCH8_5_R)
    extrude(amount=-BOSS_EXTRUDE11_DEPTH)


with BuildPart() as body_6:
    # Sketch12 → Boss-Extrude12 (new body)
    with BuildSketch(Plane(origin=(0, 4, 0), x_dir=(1, 0, 0), z_dir=(0, 1, 0))):
        with BuildLine():
            ThreePointArc((-40.162831687, 54.502172006), (-38.331638528, 54.743253159), (-37.4787914, 56.381557247))
            ThreePointArc((-37.4787914, 56.381557247), (-37.840487312, 57.52871012), (-38.794751114, 58.260942489))
            ThreePointArc((-38.794751114, 58.260942489), (-41.358176642, 57.065597534), (-40.162831687, 54.502172006))
        make_face()
    extrude(amount=-BOSS_EXTRUDE12_DEPTH)

    # Sketch12<3> → Boss-Extrude13 (add)
    with BuildSketch(Plane(origin=(0, 4, 0), x_dir=(1, 0, 0), z_dir=(0, 1, 0))):
        with Locations(Location((-39.4787914, 56.381557247, 0), (0, 0, 270))):
            Circle(SKETCH12_3_R)
    extrude(amount=BOSS_EXTRUDE13_DEPTH)


with BuildPart() as body_7:
    # Sketch13 → Boss-Extrude14 (new body)
    with BuildSketch(Plane(origin=(0, 4, 0), x_dir=(1, 0, 0), z_dir=(0, 1, 0))):
        with BuildLine():
            ThreePointArc((80.5212086, 16.881557247), (81.935422162, 17.467343685), (82.5212086, 18.881557247))
            ThreePointArc((82.5212086, 18.881557247), (81.935422162, 20.29577081), (80.5212086, 20.881557247))
            ThreePointArc((80.5212086, 20.881557247), (78.5212086, 18.881557247), (80.5212086, 16.881557247))
        make_face()
    extrude(amount=-BOSS_EXTRUDE14_DEPTH)

    # Sketch13<3> → Boss-Extrude15 (add)
    with BuildSketch(Plane(origin=(0, 4, 0), x_dir=(1, 0, 0), z_dir=(0, 1, 0))):
        with Locations(Location((80.5212086, 18.881557247, 0), (0, 0, 270))):
            Circle(SKETCH13_3_R)
    extrude(amount=BOSS_EXTRUDE15_DEPTH)


solid = Compound([part.part, body_2.part, body_3.part, body_4.part, body_5.part, body_6.part, body_7.part])
